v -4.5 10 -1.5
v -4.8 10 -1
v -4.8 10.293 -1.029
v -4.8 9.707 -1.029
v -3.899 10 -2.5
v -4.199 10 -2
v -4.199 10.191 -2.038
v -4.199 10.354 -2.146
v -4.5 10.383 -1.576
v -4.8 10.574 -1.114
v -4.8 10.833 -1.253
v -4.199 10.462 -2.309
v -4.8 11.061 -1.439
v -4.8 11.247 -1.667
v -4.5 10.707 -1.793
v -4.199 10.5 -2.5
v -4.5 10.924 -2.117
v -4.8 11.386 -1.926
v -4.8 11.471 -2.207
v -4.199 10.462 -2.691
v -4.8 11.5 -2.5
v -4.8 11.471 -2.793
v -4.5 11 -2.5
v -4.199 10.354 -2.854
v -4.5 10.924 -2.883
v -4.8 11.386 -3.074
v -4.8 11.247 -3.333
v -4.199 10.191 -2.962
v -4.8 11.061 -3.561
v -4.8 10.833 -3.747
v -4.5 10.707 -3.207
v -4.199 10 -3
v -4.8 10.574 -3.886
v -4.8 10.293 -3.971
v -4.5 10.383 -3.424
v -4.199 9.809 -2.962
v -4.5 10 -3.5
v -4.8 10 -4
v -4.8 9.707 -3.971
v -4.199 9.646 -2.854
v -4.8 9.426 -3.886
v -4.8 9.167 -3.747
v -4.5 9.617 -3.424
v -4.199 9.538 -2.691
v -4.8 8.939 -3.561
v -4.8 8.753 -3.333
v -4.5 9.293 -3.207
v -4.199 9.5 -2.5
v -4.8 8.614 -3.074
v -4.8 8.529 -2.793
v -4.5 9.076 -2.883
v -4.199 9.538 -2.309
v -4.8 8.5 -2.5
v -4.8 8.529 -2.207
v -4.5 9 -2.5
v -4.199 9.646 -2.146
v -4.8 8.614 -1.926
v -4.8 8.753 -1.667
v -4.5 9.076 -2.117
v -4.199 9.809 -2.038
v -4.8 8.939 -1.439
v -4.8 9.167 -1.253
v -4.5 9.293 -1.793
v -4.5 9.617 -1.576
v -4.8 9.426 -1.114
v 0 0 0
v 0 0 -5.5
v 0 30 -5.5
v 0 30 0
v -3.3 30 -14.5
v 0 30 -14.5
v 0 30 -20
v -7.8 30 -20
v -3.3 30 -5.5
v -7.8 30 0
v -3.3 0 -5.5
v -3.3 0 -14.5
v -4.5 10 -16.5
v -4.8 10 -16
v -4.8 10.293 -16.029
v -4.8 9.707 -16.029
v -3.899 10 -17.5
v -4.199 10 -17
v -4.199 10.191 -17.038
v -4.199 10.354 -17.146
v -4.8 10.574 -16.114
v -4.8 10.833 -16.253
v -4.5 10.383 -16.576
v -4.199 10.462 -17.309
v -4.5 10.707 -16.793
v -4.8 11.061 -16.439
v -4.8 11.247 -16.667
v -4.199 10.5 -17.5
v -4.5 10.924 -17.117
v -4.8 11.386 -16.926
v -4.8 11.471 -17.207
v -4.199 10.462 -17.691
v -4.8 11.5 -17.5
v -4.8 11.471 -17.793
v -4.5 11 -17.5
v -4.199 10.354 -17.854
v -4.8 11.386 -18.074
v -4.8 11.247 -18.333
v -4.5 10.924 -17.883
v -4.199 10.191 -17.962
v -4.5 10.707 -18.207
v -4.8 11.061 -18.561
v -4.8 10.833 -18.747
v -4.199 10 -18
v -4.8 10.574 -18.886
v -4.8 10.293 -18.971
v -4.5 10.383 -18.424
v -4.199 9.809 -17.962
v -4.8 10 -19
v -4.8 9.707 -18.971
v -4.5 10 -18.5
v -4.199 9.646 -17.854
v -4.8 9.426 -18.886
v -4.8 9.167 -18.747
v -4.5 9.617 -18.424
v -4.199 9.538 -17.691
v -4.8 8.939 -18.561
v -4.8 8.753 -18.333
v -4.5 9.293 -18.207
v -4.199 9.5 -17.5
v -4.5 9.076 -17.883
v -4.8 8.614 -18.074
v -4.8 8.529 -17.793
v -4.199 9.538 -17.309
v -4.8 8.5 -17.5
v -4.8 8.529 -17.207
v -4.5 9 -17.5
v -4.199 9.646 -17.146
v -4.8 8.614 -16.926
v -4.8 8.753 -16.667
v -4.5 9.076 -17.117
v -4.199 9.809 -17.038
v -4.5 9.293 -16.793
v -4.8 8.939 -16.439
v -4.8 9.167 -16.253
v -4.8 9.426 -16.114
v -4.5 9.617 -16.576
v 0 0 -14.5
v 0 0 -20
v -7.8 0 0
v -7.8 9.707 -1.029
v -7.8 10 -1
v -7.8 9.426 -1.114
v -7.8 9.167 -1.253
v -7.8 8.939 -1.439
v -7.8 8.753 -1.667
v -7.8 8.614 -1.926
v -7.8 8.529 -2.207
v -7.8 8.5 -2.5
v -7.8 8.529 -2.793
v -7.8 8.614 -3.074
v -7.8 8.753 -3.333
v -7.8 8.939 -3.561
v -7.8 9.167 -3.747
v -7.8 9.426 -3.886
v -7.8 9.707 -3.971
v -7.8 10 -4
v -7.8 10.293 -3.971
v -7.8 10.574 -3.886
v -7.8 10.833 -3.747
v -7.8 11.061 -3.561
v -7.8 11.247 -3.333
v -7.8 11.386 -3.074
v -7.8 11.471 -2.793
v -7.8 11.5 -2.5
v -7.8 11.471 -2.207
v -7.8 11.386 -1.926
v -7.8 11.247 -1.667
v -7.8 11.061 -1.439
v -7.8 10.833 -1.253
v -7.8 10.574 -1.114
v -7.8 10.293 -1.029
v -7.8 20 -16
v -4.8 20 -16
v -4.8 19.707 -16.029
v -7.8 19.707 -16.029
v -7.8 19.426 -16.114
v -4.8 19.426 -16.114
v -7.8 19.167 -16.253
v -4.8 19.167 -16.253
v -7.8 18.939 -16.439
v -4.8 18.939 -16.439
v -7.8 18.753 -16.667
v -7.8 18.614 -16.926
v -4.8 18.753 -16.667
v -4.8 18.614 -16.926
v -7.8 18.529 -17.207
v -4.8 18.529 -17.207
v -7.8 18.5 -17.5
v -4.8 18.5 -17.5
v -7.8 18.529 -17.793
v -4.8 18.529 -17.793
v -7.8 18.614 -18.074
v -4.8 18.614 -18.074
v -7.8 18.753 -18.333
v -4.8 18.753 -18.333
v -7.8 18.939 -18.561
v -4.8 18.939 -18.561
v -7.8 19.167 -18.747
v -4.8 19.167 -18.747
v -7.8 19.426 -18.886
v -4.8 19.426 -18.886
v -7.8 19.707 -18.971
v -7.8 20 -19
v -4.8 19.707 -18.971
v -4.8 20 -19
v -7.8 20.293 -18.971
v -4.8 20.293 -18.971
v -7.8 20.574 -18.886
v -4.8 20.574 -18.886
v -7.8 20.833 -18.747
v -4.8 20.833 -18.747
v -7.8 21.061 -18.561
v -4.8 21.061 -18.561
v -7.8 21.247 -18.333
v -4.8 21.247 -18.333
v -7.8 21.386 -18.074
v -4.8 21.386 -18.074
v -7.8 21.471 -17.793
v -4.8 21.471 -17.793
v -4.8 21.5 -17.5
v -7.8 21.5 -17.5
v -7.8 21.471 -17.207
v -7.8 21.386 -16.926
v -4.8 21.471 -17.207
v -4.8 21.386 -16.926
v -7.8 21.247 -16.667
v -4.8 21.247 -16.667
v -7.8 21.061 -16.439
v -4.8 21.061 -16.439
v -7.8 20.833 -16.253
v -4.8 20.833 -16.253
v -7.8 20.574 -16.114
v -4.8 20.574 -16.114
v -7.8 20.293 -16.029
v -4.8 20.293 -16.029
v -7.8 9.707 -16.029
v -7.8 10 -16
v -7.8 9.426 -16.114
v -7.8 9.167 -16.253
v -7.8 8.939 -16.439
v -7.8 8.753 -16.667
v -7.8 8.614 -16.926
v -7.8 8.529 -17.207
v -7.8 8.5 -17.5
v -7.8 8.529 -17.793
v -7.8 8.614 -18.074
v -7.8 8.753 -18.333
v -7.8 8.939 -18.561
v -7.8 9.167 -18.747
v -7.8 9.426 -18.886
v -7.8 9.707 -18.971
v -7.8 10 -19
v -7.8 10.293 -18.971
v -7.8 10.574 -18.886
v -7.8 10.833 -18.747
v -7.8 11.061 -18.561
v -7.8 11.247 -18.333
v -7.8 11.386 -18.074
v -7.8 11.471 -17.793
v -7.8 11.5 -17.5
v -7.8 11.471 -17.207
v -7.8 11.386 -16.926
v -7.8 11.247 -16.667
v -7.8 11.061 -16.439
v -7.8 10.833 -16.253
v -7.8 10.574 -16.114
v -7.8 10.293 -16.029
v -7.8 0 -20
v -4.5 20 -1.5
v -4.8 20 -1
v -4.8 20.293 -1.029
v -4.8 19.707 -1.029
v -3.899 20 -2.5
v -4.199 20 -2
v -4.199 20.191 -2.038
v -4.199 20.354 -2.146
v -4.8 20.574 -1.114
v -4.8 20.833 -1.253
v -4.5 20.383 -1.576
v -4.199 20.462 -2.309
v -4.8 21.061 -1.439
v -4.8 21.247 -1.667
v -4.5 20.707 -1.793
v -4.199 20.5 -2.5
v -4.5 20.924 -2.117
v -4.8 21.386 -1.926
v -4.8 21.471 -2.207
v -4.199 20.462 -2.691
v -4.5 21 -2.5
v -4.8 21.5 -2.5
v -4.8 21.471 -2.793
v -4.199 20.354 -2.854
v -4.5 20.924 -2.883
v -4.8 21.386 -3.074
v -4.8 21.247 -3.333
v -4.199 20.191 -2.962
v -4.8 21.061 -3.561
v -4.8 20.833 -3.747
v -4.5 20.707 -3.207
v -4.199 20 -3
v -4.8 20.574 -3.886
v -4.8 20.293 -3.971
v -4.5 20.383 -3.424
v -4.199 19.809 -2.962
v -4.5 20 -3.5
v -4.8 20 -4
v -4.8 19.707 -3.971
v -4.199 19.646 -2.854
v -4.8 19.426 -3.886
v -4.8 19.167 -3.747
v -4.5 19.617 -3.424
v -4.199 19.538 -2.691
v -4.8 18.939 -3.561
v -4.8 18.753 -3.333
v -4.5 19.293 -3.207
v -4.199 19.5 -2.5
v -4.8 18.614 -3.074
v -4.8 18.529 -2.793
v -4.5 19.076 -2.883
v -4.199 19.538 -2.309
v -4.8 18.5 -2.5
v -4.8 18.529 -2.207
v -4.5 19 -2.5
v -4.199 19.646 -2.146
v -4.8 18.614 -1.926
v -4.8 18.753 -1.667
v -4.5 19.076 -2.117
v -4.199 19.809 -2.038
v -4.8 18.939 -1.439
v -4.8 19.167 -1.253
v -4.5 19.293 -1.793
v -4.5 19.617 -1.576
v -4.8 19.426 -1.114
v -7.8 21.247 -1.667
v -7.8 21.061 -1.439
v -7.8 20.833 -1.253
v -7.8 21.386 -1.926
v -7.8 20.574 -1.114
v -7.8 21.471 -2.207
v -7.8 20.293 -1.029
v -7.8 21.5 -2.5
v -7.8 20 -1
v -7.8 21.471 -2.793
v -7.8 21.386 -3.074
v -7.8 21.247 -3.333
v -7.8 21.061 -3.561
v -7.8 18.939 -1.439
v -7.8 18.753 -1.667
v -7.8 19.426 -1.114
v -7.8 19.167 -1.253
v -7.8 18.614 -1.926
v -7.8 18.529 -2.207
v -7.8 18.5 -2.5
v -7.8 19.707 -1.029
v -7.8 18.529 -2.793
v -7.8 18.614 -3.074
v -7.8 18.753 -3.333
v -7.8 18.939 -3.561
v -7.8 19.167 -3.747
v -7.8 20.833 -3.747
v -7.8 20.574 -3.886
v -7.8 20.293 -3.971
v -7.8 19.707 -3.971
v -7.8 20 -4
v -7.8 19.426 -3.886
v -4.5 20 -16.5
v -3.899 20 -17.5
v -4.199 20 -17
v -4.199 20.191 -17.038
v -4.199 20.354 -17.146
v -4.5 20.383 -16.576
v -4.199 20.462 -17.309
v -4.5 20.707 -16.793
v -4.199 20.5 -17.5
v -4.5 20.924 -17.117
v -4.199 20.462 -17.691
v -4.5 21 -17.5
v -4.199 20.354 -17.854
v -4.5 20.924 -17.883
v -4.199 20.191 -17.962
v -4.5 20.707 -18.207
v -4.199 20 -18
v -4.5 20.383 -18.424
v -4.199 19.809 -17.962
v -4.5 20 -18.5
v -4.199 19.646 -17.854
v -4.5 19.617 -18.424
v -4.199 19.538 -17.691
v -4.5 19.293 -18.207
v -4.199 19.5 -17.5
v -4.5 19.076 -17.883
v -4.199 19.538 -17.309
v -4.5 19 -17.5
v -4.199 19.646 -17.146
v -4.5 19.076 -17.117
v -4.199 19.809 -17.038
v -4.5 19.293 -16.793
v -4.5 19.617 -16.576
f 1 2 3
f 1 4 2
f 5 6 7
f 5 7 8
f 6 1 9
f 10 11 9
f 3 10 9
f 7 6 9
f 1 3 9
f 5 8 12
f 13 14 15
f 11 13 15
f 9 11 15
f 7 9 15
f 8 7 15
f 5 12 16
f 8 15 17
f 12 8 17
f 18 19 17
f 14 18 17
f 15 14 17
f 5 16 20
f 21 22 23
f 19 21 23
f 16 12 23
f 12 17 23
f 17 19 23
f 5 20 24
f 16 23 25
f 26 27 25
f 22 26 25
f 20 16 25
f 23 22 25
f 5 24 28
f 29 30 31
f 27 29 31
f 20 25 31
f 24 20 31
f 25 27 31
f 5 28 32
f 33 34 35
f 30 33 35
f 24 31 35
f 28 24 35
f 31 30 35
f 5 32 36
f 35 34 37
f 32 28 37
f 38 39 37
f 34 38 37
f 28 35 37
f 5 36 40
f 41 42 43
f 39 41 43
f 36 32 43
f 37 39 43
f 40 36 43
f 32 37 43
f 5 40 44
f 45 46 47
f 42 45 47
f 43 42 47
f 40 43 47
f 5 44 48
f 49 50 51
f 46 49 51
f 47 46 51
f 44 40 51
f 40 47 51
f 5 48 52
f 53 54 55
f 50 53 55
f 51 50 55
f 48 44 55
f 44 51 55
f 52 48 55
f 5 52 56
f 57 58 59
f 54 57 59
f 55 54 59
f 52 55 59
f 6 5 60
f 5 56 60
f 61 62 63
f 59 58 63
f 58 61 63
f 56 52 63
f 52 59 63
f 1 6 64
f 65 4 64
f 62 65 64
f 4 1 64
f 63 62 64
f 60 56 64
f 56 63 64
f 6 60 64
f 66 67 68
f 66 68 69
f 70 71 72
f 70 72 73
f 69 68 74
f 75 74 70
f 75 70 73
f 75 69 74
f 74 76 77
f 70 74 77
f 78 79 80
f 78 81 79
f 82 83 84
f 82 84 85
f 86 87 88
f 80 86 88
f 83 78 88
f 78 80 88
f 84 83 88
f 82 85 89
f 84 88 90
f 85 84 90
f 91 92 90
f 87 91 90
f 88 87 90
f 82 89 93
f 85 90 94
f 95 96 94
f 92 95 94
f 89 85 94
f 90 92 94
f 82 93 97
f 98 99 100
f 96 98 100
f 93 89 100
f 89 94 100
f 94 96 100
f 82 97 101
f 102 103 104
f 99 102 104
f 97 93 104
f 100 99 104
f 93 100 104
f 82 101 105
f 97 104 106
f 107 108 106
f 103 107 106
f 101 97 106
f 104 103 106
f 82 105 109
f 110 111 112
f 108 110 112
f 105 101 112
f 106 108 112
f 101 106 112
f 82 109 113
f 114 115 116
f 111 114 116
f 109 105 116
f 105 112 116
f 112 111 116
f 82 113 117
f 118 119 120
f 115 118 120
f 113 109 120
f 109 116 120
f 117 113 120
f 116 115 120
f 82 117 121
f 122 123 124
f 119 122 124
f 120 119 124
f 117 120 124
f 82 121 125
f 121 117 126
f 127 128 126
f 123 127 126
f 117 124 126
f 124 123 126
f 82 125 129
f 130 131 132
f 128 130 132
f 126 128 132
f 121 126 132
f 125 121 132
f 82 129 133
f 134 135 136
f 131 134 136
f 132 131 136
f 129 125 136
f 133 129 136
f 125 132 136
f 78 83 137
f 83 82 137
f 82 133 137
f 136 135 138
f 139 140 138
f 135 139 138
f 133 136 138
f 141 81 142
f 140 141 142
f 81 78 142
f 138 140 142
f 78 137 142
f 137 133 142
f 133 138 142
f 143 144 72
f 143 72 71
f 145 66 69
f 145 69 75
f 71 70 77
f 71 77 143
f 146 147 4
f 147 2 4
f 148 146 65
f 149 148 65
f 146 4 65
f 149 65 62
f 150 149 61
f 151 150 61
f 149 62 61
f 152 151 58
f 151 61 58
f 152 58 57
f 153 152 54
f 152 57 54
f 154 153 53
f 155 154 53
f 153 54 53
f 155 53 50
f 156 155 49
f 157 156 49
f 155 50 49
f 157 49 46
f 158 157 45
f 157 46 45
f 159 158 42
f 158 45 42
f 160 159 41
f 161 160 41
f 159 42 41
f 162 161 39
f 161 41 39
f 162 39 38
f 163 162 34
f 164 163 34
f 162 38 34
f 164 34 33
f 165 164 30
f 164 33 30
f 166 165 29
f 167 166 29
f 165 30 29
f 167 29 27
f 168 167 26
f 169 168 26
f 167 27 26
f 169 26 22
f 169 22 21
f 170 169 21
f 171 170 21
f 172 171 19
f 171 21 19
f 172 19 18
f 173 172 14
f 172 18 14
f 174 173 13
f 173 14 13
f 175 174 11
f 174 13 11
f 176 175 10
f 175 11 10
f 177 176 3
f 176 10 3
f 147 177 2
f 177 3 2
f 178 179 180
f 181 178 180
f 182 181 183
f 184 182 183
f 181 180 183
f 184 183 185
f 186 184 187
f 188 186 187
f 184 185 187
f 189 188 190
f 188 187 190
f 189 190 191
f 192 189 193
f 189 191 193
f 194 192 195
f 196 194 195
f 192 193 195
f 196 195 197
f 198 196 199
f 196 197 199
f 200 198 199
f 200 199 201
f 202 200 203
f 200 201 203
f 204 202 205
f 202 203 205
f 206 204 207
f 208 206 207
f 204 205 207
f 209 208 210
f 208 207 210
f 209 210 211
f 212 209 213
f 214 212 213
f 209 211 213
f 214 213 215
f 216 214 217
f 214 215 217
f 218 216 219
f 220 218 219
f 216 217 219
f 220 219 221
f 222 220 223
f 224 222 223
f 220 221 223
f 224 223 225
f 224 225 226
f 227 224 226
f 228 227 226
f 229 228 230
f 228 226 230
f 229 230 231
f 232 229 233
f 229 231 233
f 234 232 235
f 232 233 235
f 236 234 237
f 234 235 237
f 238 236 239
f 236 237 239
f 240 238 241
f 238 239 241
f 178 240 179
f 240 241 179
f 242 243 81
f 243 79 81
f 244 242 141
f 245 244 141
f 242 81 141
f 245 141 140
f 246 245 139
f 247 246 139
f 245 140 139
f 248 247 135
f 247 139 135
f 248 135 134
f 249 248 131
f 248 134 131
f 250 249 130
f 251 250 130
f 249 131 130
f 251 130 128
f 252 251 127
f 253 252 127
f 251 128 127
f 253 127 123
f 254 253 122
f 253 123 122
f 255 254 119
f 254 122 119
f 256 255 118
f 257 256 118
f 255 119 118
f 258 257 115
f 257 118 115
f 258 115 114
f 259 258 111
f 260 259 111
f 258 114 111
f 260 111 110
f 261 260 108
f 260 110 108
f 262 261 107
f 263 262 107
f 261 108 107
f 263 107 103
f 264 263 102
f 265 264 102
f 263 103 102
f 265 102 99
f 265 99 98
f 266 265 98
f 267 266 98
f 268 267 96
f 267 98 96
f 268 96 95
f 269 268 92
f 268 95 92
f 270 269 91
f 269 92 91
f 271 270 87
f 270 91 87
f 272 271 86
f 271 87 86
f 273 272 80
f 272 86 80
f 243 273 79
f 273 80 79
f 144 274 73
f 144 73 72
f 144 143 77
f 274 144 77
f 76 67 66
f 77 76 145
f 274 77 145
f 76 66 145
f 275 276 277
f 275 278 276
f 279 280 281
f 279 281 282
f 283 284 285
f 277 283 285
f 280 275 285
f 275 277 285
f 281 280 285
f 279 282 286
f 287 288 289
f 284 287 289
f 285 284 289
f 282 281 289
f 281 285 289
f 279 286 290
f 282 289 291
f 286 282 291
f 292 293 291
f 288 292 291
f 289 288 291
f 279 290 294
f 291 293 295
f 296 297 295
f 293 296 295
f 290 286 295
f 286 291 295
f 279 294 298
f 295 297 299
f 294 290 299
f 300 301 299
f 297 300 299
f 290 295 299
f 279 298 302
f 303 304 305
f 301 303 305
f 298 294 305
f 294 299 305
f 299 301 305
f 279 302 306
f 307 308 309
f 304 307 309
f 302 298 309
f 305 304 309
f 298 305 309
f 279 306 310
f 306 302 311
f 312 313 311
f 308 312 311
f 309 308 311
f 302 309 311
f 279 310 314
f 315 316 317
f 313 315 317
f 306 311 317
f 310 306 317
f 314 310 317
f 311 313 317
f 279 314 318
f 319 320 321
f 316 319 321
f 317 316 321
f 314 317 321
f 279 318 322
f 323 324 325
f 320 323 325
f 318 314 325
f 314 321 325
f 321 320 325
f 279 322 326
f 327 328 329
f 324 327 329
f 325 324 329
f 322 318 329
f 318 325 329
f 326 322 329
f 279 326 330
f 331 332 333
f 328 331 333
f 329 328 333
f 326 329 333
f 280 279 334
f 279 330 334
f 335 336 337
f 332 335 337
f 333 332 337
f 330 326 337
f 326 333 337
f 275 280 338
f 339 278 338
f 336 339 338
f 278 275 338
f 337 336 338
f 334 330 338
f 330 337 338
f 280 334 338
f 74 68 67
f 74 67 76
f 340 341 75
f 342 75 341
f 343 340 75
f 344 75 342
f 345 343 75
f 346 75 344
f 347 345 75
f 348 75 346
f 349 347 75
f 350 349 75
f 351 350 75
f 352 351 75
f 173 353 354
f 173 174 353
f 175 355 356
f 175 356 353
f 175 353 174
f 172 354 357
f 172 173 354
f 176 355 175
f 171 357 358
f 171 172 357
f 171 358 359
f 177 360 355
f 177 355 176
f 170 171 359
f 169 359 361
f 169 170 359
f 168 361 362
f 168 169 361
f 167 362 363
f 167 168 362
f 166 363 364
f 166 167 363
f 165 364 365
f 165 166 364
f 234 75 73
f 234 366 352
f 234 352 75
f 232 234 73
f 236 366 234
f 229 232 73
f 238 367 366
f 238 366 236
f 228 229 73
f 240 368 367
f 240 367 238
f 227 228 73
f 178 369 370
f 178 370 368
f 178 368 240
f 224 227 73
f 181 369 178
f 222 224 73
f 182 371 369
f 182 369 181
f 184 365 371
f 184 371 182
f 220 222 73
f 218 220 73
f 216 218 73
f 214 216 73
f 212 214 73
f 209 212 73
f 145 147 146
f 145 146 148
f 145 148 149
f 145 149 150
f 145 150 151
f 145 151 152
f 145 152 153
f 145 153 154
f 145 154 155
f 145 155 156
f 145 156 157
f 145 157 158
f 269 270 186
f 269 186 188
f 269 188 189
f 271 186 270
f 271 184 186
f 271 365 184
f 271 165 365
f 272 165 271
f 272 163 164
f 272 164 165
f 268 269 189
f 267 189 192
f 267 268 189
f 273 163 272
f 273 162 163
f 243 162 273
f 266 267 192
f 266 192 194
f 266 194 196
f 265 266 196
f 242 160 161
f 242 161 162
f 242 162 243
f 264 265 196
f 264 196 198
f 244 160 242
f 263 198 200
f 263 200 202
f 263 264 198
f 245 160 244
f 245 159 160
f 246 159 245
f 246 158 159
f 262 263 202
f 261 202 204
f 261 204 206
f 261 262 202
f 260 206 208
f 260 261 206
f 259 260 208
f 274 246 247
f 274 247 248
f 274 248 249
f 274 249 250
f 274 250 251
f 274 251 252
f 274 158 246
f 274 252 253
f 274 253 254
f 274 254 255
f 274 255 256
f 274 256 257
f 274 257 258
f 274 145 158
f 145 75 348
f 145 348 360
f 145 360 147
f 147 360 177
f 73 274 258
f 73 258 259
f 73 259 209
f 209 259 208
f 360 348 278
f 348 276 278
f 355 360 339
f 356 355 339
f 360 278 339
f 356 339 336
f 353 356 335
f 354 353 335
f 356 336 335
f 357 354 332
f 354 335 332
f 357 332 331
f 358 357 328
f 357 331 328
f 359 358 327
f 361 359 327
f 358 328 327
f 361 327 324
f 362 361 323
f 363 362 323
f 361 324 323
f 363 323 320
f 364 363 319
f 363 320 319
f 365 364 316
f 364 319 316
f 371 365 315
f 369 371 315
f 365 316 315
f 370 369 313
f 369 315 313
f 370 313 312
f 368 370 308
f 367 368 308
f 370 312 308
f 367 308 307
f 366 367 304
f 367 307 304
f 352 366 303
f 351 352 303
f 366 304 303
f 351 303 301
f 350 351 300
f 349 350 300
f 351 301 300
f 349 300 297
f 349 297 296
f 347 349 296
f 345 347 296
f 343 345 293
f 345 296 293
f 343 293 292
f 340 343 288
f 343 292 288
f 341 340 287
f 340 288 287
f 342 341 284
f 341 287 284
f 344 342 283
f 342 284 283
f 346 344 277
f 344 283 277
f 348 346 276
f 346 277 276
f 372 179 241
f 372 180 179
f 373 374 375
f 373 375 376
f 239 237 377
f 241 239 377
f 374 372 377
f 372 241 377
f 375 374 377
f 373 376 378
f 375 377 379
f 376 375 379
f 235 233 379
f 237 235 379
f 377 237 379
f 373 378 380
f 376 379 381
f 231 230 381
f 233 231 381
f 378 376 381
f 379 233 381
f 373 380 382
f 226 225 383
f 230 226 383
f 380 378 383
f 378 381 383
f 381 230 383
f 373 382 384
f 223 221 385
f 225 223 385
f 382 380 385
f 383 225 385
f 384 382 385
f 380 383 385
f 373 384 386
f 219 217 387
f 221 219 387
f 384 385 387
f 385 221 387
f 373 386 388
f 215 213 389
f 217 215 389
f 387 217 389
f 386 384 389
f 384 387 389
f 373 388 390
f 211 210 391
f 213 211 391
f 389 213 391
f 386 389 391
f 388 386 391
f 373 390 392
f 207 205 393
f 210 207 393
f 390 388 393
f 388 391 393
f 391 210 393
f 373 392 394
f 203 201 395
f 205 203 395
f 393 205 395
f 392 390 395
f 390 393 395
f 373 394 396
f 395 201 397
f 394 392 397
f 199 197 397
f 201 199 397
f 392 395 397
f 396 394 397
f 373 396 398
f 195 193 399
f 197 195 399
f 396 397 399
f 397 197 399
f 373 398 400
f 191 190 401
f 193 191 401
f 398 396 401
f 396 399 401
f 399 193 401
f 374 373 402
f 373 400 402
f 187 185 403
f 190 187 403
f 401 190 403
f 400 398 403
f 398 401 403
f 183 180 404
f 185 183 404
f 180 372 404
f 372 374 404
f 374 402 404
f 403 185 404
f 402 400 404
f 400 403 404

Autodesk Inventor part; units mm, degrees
ref_plane "YZ Plane" through (0, 0, 0) normal (1, 0, 0) x (0, 1, 0)
ref_plane "XZ Plane" through (0, 0, 0) normal (0, 1, 0) x (-1, 0, 0)
ref_plane "XY Plane" through (0, 0, 0) normal (0, 0, 1) x (1, 0, 0)
sketch "スケッチ1" plane through (0, 0, 0) normal (0, 1, 0) x (-1, 0, 0)
  line L0 (0, 0) -> (7.8, 0)
  line L1 (7.8, 0) -> (7.8, -20)
  line L2 (7.8, -20) -> (0, -20)
  line L3 (0, -20) -> (0, 0)
  line L4 (0, -5.5) -> (3.3, -5.5)
  line L5 (3.3, -5.5) -> (3.3, -14.5)
  line L6 (3.3, -14.5) -> (0, -14.5)
  line L7 (0, -14.5) -> (0, -5.5)
  dimension "d0" = 7.8
  dimension "d1" = 20
  dimension "d2" = 3.3
  dimension "d3" = 9
  dimension "d4" = 5.5
extrude "押し出し1" add sketch "スケッチ1" along normal blind 30 contours L0 L1 L2 L3 L6 L5 L4
sketch "スケッチ2" plane through (-7.8, 0, -20) normal (-1, 0, 0) x (0, 0, 1)
  line L0 (17.5, 30.0313) -> (17.5, 0)
  line L1 (2.5, 30.0313) -> (2.5, 0)
  line L2 (20, 0) -> (20, 30) projected
  line L3 (0, 0) -> (0, 30) projected
  line L4 (0, 30) -> (20, 30) projected
  point P0 (2.5, 20)
  point P1 (2.5, 10)
  point P2 (17.5, 20)
  point P3 (17.5, 10)
  dimension "d7" = 2.5
  dimension "d8" = 2.5
  dimension "d9" = 10
  dimension "d10" = 10
  dimension "d11" = 10
  dimension "d12" = 10
hole "穴1" at (-7.8, 20, -17.5) at (-7.8, 10, -17.5) at (-7.8, 20, -2.5) at (-7.8, 10, -2.5) direction (1, 0, 0) diameter 3 depth 3 tip angle 118
properties part number "linear_SSEB10"
